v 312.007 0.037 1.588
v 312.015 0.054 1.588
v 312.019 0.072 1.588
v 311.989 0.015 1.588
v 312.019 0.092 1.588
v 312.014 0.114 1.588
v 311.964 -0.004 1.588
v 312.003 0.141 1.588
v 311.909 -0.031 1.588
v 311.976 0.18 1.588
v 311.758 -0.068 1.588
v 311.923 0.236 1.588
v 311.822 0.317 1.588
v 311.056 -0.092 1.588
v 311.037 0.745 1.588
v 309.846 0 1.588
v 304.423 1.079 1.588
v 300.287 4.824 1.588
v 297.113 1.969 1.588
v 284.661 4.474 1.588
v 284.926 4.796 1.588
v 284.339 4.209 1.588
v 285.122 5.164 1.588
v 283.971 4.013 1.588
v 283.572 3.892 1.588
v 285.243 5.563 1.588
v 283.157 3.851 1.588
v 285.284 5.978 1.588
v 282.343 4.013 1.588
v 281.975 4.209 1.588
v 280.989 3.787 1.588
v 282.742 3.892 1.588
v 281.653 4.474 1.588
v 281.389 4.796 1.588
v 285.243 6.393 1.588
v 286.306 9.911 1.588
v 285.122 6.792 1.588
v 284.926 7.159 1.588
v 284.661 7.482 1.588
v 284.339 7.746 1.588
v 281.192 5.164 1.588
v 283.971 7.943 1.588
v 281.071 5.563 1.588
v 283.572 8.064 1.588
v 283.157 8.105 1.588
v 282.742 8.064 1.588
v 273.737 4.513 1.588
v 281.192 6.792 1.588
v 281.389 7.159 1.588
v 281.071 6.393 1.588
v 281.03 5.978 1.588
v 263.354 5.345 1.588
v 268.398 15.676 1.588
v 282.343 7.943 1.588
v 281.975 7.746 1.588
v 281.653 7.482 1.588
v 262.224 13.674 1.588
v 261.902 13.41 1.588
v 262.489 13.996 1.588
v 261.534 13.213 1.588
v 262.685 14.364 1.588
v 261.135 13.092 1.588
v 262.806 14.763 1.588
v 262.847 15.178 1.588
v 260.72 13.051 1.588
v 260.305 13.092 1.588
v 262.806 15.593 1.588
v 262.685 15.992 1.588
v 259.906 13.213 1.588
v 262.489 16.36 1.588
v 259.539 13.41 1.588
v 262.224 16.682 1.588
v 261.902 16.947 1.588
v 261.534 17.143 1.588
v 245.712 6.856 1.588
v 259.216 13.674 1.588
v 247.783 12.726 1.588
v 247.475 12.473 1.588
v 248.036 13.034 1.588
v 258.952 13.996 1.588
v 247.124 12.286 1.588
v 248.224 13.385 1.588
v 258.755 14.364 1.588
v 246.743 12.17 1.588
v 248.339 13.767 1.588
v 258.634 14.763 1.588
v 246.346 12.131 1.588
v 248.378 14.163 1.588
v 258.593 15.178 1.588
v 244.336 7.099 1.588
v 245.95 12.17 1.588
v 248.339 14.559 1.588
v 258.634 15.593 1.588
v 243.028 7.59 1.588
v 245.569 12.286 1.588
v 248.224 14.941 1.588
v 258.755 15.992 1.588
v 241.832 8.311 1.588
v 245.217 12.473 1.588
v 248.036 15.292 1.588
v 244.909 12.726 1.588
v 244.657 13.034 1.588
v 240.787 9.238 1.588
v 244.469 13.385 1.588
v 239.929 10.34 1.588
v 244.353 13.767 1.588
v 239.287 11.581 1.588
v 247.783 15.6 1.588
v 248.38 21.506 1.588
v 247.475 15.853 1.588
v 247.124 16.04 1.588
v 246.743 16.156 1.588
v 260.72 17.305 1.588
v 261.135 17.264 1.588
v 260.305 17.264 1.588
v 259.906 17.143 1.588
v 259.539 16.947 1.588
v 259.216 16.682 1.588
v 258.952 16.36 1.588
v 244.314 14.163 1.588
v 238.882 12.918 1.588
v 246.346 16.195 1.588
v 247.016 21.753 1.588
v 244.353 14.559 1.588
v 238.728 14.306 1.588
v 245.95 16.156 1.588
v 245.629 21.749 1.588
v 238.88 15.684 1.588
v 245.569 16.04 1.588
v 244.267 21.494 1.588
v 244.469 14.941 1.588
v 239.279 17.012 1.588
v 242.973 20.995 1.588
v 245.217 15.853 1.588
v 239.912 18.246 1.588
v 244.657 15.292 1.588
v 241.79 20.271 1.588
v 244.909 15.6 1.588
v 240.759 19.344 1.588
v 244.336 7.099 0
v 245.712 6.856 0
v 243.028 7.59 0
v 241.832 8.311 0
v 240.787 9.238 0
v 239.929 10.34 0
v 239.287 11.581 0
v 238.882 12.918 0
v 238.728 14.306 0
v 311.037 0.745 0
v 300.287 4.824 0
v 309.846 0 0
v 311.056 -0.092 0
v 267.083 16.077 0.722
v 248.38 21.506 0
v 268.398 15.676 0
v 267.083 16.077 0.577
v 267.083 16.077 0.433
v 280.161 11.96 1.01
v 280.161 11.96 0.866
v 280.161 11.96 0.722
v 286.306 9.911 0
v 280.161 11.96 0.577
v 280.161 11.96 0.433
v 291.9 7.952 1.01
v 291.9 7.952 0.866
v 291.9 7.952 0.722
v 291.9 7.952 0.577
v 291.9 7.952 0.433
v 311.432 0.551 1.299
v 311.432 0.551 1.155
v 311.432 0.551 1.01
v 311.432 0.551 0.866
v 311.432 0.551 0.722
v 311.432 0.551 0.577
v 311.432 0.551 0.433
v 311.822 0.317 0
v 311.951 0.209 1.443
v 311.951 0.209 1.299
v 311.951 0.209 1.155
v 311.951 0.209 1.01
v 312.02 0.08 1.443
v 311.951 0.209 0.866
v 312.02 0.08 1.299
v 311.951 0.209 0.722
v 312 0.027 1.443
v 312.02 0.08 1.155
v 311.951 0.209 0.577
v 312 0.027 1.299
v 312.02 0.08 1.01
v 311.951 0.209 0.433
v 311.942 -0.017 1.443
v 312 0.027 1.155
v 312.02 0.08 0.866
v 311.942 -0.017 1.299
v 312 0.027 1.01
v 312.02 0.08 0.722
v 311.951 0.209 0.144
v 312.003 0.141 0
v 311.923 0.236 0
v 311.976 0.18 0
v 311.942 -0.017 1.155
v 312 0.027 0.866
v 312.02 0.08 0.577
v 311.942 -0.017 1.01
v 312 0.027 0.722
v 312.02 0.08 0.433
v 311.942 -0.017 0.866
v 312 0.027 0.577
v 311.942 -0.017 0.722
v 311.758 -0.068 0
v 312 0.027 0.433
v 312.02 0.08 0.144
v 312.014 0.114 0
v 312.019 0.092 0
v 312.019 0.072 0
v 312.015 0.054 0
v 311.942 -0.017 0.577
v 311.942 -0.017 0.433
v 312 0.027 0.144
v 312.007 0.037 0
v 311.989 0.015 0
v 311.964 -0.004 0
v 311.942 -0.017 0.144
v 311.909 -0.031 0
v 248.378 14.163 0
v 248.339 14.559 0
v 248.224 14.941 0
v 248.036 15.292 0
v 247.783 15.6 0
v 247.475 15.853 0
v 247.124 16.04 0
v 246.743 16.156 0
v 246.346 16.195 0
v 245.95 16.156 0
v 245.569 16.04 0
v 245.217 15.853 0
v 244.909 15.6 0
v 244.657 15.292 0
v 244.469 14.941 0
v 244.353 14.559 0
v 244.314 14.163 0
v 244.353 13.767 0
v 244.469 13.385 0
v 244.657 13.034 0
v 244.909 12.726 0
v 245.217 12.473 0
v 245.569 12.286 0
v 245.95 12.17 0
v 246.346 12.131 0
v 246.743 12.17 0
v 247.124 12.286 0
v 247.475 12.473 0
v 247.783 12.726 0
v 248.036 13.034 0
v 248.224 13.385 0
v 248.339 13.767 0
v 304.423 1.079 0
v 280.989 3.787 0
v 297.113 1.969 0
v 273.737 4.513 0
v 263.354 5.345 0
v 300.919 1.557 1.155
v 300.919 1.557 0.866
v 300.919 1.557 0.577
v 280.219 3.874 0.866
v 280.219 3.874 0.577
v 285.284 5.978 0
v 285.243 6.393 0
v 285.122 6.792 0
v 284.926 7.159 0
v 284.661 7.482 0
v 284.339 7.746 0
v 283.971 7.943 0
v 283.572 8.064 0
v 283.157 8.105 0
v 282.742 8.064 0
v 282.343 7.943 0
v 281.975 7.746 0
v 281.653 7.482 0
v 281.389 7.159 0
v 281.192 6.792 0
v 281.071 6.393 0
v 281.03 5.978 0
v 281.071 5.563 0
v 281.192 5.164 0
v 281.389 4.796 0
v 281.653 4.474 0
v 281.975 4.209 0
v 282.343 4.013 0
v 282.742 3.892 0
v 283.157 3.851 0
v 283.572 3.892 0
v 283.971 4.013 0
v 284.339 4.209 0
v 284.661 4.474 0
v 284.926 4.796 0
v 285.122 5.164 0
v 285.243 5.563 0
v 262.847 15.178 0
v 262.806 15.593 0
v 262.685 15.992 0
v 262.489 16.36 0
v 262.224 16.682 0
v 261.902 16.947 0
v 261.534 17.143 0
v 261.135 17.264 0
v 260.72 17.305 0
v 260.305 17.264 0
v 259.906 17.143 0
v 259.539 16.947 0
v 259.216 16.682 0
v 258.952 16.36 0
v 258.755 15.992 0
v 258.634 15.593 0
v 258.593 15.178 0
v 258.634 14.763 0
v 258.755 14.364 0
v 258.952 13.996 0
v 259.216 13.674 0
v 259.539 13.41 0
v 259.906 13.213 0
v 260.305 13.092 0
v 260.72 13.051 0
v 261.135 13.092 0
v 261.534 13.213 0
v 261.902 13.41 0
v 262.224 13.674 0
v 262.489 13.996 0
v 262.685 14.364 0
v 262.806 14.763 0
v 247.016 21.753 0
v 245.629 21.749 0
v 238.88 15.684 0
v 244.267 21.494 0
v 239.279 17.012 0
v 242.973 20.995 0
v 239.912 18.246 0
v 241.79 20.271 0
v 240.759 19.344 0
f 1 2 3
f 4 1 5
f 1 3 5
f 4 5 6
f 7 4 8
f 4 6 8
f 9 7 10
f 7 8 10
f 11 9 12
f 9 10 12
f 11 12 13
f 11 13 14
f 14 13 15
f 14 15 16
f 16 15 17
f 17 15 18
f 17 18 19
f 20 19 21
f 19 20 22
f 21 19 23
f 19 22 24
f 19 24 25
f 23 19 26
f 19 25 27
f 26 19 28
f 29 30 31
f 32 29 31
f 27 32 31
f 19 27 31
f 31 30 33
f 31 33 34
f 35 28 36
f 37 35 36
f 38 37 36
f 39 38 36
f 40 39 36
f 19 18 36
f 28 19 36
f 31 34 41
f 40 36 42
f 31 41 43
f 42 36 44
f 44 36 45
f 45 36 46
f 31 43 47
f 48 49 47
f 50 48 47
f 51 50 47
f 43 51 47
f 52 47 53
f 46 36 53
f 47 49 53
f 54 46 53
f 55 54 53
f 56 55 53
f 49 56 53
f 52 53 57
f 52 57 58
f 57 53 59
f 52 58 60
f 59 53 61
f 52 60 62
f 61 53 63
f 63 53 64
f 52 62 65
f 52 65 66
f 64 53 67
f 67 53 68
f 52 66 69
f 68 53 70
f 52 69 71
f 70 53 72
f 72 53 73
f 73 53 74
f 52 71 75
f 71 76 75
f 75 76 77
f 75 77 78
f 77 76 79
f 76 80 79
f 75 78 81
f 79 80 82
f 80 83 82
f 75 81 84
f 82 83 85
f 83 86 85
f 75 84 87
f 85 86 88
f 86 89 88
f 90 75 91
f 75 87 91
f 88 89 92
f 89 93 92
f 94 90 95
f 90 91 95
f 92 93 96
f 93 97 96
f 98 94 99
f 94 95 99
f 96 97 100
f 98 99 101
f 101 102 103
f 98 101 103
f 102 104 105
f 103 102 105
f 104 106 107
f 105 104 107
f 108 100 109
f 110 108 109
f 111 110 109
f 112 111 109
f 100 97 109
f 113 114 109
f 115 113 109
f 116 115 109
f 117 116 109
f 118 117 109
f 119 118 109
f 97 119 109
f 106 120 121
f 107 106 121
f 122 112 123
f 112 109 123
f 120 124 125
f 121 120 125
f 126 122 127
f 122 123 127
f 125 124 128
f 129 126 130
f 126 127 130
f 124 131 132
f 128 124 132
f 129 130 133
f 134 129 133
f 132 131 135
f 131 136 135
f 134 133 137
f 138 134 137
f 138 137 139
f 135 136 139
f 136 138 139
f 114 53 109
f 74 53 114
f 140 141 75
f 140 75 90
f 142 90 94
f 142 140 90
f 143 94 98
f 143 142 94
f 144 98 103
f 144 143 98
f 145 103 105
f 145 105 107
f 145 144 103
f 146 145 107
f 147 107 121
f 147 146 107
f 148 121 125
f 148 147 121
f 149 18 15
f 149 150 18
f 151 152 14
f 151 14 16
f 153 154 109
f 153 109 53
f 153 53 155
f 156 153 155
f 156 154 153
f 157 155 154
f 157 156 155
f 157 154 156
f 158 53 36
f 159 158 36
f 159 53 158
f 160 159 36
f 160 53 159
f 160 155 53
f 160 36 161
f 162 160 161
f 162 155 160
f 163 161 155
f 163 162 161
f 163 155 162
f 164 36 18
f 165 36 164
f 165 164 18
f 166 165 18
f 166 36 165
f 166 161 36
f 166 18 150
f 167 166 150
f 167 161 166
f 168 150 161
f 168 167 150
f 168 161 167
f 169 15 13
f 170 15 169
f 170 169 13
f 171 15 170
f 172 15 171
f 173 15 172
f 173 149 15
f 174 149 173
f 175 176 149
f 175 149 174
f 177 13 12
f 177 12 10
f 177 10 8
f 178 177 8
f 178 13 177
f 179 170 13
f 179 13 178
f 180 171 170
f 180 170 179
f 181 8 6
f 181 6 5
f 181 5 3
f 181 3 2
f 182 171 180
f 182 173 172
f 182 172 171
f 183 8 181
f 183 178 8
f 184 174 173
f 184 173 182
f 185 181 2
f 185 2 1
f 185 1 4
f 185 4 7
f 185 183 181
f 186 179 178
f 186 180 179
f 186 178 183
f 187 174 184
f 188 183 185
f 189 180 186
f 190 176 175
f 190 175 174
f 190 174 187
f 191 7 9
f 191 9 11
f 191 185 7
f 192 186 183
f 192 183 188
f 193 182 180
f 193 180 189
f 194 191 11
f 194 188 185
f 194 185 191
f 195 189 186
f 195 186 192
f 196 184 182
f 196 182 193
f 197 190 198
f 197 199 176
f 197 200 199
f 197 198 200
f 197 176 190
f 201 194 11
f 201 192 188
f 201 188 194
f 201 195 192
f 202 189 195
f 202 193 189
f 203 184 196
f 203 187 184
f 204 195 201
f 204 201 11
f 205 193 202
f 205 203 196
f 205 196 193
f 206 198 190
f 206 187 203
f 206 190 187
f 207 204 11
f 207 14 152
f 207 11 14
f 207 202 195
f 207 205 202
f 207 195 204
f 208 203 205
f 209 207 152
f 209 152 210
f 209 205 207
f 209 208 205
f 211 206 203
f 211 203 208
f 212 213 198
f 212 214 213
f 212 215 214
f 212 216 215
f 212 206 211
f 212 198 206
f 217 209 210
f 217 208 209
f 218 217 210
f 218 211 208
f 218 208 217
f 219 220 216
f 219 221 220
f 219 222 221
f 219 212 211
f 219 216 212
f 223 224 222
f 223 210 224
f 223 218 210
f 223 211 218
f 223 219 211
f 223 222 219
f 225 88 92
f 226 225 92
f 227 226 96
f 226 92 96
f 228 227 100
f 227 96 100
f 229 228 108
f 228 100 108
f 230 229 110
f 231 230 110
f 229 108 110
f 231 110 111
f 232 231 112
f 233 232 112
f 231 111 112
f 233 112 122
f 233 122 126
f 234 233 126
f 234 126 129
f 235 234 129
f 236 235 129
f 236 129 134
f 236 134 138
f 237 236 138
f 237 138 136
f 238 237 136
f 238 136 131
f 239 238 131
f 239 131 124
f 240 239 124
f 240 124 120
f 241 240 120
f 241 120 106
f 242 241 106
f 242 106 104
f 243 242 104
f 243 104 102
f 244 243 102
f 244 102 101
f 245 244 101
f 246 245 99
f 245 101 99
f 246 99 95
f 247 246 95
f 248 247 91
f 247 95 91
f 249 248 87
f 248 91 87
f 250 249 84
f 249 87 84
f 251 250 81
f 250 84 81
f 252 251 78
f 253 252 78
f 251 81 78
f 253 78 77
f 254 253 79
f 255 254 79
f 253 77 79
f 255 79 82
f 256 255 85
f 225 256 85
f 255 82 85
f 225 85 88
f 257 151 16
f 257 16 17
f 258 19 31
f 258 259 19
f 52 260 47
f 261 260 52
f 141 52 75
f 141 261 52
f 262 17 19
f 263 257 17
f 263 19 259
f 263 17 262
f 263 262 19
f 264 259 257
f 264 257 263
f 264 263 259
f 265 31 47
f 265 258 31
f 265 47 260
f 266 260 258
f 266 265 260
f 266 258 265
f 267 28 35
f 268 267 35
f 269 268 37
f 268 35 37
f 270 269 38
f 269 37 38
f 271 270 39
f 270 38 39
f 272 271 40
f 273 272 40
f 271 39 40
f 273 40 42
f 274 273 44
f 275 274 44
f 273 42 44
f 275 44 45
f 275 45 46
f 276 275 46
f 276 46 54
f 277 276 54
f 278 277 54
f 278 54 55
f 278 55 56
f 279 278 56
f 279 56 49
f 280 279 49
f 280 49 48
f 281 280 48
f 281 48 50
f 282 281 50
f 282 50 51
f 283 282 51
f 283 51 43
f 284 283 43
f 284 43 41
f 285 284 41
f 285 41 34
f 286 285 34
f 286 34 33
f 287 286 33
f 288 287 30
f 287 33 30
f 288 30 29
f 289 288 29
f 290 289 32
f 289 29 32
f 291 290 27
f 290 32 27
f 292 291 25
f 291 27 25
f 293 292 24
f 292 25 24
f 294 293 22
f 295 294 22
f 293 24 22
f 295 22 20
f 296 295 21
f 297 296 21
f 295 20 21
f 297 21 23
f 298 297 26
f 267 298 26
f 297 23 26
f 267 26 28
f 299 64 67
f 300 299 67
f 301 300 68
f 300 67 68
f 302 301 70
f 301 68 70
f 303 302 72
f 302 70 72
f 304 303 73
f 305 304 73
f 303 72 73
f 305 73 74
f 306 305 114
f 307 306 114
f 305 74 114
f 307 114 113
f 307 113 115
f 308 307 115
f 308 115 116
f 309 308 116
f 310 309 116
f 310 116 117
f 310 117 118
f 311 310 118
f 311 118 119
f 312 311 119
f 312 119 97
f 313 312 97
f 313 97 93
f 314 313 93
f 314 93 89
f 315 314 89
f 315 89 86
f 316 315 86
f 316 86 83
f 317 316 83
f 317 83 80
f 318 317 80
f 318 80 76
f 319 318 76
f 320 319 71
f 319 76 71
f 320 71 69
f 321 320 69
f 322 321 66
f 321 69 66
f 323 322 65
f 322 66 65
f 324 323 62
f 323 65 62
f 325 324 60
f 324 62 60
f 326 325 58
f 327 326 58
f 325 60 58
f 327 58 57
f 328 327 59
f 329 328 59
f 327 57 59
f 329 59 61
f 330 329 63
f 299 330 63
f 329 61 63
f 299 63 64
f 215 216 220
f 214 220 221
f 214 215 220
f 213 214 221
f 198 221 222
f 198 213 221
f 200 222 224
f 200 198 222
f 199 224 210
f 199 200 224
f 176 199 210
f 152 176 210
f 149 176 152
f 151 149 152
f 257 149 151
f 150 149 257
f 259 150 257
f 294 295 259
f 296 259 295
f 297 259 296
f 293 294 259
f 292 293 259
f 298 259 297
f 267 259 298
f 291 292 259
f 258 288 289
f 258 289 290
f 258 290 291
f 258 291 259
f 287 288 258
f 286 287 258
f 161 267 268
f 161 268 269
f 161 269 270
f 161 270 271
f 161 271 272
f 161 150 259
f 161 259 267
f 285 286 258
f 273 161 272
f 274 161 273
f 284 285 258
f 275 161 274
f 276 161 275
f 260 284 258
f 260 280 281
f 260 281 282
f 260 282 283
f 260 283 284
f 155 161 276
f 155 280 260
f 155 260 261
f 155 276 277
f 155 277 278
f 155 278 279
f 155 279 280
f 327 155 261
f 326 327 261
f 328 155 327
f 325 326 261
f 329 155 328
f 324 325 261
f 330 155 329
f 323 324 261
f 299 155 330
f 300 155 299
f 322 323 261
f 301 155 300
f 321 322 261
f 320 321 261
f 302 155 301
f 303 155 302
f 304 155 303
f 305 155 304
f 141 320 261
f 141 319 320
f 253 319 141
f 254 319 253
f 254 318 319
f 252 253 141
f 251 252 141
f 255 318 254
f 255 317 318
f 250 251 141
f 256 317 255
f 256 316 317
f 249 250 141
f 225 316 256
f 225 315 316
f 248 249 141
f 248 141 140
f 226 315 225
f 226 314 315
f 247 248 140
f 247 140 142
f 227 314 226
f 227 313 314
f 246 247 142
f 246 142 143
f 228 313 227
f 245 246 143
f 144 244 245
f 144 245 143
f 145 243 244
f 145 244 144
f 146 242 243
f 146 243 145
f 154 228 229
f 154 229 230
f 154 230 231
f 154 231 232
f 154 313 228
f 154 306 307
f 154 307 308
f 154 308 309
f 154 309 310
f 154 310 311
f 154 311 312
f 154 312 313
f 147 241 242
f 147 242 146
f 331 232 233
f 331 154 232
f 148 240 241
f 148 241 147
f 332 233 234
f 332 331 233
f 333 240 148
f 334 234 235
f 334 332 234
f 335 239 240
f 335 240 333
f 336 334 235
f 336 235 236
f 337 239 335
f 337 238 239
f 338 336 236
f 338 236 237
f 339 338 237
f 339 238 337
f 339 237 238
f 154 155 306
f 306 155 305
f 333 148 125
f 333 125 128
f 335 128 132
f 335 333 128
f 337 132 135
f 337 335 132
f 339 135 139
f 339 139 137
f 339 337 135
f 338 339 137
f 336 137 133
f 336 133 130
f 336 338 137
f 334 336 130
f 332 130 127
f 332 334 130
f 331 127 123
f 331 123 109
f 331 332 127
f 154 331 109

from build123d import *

# Parameters (mm, degrees)
BOSS_EXTRUDE1_DEPTH = 1.5875
SKETCH2_R           = 6.35
SKETCH2_R_2         = 3.175
CUT_EXTRUDE1_DEPTH  = 316.731983488
SKETCH3_W           = 329.065813824
SKETCH3_H           = 177.30262506
CUT_EXTRUDE2_DEPTH  = 316.731983488
FILLET1_DEPTH       = 1.5875
SKETCH4_R           = 2.032
CUT_EXTRUDE3_DEPTH  = 2.54
SKETCH5_R           = 2.127
CUT_EXTRUDE4_DEPTH  = 2.54


with BuildPart() as part:
    # Sketch1 → Boss-Extrude1 (new body)
    with BuildSketch(Plane.XY):
        with BuildLine():
            add(Edge.make_bspline(
                [(0.000560351, 0.000130087), (0.810633127, 7.359196055), (8.649092025, 17.856605174), (26.286719818, 29.975176328), (52.111128271, 42.069215275), (89.597618475, 49.290763054), (131.400792109, 47.884831915), (173.256699242, 40.041104278), (217.961060472, 29.612974894), (256.952064401, 19.528920948), (290.35983767, 8.71099439), (301.273197721, 4.382828139), (314.816918223, -0.516206742), (309.846313895, 0.000130087)],
                knots=[0, 0, 0, 0, 0.060863618, 0.113688265, 0.188608742, 0.312908923, 0.448482434, 0.557612135, 0.691544113, 0.852438279, 0.92975597, 0.976058229, 1, 1, 1, 1], degree=3))
            add(Edge.make_bspline(
                [(309.846313895, 0.000130087), (303.956832565, 1.47095521), (293.989507544, 2.093987313), (276.26402299, 4.514356704), (260.846344817, 5.427413394), (235.858814759, 7.870306192), (205.101424636, 8.838080282), (157.718638092, 9.030650149), (110.497331172, 6.181495223), (66.506197185, -0.586669107), (36.454672816, -6.098499901), (15.316603331, -6.189065841), (1.230714189, -6.924076091), (0.000560351, 0.000130087)],
                knots=[0, 0, 0, 0, 0.057787081, 0.095274891, 0.171021118, 0.205339302, 0.335319146, 0.464904334, 0.658702312, 0.785511947, 0.893517288, 0.94309214, 1, 1, 1, 1], degree=3))
        make_face()
    extrude(amount=BOSS_EXTRUDE1_DEPTH)

    # Sketch2 → Cut-Extrude1 (cut, through all)
    with BuildSketch(Plane.XY.offset(1.5875)):
        with Locations((20.32, 10.16)):
            Circle(SKETCH2_R)
        with Locations((227.296313895, 19.050130087)):
            Circle(SKETCH2_R_2)
    extrude(amount=-CUT_EXTRUDE1_DEPTH, mode=Mode.SUBTRACT)

    # Sketch3 → Cut-Extrude2 (cut, through all)
    with BuildSketch(Plane.XY.offset(1.5875)):
        with Locations((74.193406983, 18.895182109)):
            Rectangle(SKETCH3_W, SKETCH3_H)
    extrude(amount=-CUT_EXTRUDE2_DEPTH, mode=Mode.SUBTRACT)

    # Fillet1: read off the stored shape, not the designer's step
    # Fillet1 outline → Fillet1 (cut)
    with BuildSketch(Plane.XY):
        with BuildLine():
            ThreePointArc((245.711534403, 6.855899952), (240.78695405, 9.238088014), (238.727660088, 14.306186276))
            ThreePointArc((238.727660088, 14.306186276), (241.790276652, 20.270898068), (248.380487069, 21.506427765))
            add(Edge.make_bspline(
                [(248.380487069, 21.506427765), (245.14201846, 22.403497776), (241.927955434, 23.272784833), (238.726313893, 24.121097226)],
                knots=[0.203822749, 0.203822749, 0.203822749, 0.203822749, 0.233593651, 0.233593651, 0.233593651, 0.233593651], degree=3))
            Line((238.726313893, 24.121097226), (238.726313894, 7.379528673))
            add(Edge.make_bspline(
                [(238.726313894, 7.379528673), (241.056196666, 7.224072569), (243.384717208, 7.05041014), (245.711534403, 6.855899952)],
                knots=[0.772010011, 0.772010011, 0.772010011, 0.772010011, 0.794337025, 0.794337025, 0.794337025, 0.794337025], degree=3))
        make_face()
    extrude(amount=FILLET1_DEPTH, mode=Mode.SUBTRACT)

    # Sketch4 → Cut-Extrude3 (cut)
    with BuildSketch(Plane.XY.offset(1.5875)):
        with Locations((246.346313895, 14.162958592)):
            Circle(SKETCH4_R)
    extrude(amount=-CUT_EXTRUDE3_DEPTH, mode=Mode.SUBTRACT)

    # Sketch5 → Cut-Extrude4 (cut)
    with BuildSketch(Plane.XY.offset(1.5875)):
        with Locations((260.720225155, 15.178172845)):
            Circle(SKETCH5_R)
        with Locations((283.157187456, 5.977798132)):
            Circle(SKETCH5_R)
    extrude(amount=-CUT_EXTRUDE4_DEPTH, mode=Mode.SUBTRACT)


solid = part.part
